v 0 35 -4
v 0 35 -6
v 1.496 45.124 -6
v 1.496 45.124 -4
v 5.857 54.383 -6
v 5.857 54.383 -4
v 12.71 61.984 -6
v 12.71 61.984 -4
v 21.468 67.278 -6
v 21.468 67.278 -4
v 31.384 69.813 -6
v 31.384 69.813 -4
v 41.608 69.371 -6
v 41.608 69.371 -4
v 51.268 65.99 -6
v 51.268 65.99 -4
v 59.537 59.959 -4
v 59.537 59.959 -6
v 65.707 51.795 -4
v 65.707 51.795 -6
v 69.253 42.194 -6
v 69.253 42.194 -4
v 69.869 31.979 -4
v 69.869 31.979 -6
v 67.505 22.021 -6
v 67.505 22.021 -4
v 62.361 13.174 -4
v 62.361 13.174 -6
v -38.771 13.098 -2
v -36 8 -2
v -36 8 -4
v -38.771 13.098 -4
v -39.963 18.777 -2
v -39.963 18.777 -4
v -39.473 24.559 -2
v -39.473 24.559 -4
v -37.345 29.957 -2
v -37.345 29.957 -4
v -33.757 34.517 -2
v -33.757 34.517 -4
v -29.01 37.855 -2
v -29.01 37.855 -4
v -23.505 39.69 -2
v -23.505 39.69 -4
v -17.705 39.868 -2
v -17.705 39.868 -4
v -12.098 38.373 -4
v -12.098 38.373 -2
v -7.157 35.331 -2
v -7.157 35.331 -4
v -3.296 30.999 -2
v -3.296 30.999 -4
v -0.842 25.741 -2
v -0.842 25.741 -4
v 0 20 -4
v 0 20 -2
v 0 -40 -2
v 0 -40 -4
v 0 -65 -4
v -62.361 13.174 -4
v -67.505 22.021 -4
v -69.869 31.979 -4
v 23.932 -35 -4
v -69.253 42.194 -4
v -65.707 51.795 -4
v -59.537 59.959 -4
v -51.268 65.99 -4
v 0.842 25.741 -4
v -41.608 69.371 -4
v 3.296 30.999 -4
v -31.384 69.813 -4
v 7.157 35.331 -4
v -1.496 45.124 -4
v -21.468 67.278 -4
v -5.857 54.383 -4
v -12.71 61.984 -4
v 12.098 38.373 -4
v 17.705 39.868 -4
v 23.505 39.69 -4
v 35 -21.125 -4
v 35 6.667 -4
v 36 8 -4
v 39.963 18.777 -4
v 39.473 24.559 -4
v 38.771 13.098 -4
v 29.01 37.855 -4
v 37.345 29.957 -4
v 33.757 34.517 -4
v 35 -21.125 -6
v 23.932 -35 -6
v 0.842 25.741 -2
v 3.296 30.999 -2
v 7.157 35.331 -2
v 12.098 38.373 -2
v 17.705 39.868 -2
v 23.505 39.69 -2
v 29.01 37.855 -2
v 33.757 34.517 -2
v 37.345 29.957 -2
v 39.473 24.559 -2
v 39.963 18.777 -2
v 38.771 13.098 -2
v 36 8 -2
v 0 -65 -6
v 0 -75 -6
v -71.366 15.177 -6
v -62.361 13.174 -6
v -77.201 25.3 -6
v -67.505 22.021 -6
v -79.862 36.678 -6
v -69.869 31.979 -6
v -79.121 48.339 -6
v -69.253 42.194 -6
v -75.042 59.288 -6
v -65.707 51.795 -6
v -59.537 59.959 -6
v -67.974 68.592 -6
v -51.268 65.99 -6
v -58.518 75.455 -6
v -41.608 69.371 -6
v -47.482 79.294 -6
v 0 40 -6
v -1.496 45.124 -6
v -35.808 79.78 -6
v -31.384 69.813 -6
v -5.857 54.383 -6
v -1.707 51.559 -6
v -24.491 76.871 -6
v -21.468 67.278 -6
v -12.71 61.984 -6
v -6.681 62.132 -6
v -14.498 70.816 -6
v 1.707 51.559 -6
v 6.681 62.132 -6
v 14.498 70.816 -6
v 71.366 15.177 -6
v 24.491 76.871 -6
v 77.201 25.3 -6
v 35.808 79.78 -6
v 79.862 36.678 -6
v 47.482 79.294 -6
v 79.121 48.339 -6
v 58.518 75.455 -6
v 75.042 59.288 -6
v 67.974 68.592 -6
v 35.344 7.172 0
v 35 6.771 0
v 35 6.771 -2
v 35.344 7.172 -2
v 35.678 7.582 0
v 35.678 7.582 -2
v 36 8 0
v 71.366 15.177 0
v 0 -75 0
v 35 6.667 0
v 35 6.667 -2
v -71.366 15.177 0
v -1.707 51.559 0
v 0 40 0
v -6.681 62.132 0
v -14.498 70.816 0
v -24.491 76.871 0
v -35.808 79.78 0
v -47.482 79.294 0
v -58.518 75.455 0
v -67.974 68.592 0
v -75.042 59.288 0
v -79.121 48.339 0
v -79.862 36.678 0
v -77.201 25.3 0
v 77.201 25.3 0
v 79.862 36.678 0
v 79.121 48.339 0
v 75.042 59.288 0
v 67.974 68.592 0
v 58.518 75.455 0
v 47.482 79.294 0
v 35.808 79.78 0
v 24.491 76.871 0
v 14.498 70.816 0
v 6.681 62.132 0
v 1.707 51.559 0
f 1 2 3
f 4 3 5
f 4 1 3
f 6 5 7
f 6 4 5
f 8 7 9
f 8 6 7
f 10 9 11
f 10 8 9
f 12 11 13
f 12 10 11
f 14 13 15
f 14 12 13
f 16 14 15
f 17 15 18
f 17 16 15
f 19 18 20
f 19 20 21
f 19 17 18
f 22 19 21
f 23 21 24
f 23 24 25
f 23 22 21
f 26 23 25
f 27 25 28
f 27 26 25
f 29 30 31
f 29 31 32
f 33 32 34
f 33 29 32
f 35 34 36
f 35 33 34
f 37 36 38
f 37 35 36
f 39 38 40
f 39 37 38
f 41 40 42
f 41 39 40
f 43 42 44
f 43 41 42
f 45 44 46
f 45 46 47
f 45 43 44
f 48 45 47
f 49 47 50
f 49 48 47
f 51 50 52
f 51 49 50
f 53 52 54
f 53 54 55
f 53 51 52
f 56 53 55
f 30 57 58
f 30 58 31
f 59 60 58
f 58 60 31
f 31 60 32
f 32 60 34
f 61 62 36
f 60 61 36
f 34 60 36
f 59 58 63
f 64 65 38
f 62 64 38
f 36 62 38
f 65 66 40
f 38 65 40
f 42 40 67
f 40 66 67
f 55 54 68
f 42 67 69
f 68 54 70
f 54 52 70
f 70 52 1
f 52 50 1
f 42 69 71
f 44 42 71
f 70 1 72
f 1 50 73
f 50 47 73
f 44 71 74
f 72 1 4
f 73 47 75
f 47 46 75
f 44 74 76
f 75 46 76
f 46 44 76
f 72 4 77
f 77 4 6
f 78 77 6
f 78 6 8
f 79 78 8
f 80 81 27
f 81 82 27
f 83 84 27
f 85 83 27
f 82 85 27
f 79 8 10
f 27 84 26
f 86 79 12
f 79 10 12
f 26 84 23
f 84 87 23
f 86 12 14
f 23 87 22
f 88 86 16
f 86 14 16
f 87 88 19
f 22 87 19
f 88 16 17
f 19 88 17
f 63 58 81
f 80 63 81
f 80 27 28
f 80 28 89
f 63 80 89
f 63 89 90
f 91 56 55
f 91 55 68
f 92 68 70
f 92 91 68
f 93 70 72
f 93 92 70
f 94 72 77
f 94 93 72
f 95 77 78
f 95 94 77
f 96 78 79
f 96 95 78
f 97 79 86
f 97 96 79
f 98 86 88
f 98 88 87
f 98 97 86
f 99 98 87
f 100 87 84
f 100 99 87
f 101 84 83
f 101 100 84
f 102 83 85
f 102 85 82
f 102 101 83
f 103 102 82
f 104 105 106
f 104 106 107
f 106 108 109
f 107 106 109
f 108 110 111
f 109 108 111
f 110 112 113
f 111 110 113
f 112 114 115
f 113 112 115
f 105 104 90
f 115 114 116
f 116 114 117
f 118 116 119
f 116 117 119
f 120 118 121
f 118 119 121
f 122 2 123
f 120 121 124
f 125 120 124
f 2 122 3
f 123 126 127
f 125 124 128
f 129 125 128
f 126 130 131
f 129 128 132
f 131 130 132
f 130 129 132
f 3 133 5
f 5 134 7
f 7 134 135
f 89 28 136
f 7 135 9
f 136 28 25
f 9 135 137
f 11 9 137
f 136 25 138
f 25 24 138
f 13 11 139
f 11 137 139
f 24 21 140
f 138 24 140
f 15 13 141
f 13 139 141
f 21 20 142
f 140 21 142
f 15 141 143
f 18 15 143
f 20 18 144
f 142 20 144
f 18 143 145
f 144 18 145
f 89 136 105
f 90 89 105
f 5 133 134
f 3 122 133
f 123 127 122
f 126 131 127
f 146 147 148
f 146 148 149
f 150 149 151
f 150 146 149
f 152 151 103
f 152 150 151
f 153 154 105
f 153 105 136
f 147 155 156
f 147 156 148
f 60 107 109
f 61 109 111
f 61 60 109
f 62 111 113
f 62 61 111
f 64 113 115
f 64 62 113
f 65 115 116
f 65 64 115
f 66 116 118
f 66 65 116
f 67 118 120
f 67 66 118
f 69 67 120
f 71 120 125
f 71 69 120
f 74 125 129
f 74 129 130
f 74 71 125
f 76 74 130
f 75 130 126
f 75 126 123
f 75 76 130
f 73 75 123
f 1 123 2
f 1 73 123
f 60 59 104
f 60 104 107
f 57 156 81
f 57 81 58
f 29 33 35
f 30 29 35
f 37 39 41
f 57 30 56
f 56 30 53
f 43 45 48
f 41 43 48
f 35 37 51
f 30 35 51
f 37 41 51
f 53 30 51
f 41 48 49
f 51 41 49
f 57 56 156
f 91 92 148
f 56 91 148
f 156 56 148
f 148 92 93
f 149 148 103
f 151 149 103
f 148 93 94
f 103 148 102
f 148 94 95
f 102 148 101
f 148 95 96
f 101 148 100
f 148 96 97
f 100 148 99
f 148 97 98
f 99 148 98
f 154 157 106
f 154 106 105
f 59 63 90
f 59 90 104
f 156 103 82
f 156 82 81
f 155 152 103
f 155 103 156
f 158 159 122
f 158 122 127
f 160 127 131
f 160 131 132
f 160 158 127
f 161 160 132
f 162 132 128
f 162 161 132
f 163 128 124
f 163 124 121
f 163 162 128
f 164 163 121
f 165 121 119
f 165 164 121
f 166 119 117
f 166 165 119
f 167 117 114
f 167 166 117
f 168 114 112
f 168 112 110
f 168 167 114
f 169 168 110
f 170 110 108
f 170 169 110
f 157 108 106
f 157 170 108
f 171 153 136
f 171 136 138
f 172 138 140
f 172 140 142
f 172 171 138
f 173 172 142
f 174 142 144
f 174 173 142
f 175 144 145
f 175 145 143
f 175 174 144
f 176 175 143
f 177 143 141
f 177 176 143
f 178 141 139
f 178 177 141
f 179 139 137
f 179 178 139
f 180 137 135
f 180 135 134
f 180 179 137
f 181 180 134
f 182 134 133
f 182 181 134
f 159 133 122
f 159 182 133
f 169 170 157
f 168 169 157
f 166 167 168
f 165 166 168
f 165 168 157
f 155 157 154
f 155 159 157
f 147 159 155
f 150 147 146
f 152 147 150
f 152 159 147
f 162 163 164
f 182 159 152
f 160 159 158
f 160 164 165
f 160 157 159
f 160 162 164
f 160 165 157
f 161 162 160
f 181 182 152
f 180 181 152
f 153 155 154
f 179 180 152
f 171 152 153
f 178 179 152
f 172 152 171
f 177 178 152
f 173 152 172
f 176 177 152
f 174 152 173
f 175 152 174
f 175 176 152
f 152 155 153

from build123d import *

# Parameters (mm, degrees)
F1_DEPTH = 6
F2_DEPTH = 4
F3_DEPTH = 2


with BuildPart() as f1:
    # F0 (on Top) → F1 (new body)
    with BuildSketch(Plane.XY):
        with BuildLine():
            Line((0, -75), (71.3659359191, 15.1770657673))
            ThreePointArc((71.3659359191, 15.1770657673), (53.1408249977, 77.7798718682), (0, 40))
            ThreePointArc((0, 40), (-53.1408249977, 77.7798718682), (-71.3659359191, 15.1770657673))
            Line((-71.3659359191, 15.1770657673), (0, -75))
        make_face()
        with BuildLine():
            ThreePointArc((-62.3608017817, 13.1737193764), (-46.5622648655, 68.0350424728), (0, 35))
            ThreePointArc((0, 35), (46.5622648655, 68.0350424728), (62.3608017817, 13.1737193764))
            Line((62.3608017817, 13.1737193764), (35, -21.125))
            Line((35, -21.125), (23.9316239316, -35))
            Line((23.9316239316, -35), (0, -65))
            Line((0, -65), (-62.3608017817, 13.1737193764))
        make_face(mode=Mode.SUBTRACT)
    extrude(amount=-F1_DEPTH)

    # F0 (on Top) → F2 (join)
    with BuildSketch(Plane.XY):
        with BuildLine():
            ThreePointArc((62.3608017817, 13.1737193764), (46.5622648655, 68.0350424728), (0, 35))
            ThreePointArc((0, 35), (-46.5622648655, 68.0350424728), (-62.3608017817, 13.1737193764))
            Line((-62.3608017817, 13.1737193764), (0, -65))
            Line((0, -65), (23.9316239316, -35))
            Line((23.9316239316, -35), (35, -21.125))
            Line((35, -21.125), (62.3608017817, 13.1737193764))
        make_face()
        with BuildLine():
            Line((35, 6.6666666667), (0, -40))
            Line((0, -40), (-36, 8))
            ThreePointArc((-36, 8), (-26.3245553203, 38.973665961), (0, 20))
            ThreePointArc((0, 20), (26.3245553203, 38.973665961), (36, 8))
            Line((36, 8), (35, 6.6666666667))
        make_face(mode=Mode.SUBTRACT)
    extrude(amount=-F2_DEPTH)

    # F0 (on Top) → F3 (join)
    with BuildSketch(Plane.XY):
        with BuildLine():
            Line((-36, 8), (0, -40))
            Line((0, -40), (35, 6.6666666667))
            Line((35, 6.6666666667), (35, 6.7712434447))
            ThreePointArc((35, 6.7712434447), (35.5121713718, 7.3757162844), (36, 8))
            ThreePointArc((36, 8), (26.3245553203, 38.973665961), (0, 20))
            ThreePointArc((0, 20), (-26.3245553203, 38.973665961), (-36, 8))
        make_face()
    extrude(amount=-F3_DEPTH)


solid = f1.part
